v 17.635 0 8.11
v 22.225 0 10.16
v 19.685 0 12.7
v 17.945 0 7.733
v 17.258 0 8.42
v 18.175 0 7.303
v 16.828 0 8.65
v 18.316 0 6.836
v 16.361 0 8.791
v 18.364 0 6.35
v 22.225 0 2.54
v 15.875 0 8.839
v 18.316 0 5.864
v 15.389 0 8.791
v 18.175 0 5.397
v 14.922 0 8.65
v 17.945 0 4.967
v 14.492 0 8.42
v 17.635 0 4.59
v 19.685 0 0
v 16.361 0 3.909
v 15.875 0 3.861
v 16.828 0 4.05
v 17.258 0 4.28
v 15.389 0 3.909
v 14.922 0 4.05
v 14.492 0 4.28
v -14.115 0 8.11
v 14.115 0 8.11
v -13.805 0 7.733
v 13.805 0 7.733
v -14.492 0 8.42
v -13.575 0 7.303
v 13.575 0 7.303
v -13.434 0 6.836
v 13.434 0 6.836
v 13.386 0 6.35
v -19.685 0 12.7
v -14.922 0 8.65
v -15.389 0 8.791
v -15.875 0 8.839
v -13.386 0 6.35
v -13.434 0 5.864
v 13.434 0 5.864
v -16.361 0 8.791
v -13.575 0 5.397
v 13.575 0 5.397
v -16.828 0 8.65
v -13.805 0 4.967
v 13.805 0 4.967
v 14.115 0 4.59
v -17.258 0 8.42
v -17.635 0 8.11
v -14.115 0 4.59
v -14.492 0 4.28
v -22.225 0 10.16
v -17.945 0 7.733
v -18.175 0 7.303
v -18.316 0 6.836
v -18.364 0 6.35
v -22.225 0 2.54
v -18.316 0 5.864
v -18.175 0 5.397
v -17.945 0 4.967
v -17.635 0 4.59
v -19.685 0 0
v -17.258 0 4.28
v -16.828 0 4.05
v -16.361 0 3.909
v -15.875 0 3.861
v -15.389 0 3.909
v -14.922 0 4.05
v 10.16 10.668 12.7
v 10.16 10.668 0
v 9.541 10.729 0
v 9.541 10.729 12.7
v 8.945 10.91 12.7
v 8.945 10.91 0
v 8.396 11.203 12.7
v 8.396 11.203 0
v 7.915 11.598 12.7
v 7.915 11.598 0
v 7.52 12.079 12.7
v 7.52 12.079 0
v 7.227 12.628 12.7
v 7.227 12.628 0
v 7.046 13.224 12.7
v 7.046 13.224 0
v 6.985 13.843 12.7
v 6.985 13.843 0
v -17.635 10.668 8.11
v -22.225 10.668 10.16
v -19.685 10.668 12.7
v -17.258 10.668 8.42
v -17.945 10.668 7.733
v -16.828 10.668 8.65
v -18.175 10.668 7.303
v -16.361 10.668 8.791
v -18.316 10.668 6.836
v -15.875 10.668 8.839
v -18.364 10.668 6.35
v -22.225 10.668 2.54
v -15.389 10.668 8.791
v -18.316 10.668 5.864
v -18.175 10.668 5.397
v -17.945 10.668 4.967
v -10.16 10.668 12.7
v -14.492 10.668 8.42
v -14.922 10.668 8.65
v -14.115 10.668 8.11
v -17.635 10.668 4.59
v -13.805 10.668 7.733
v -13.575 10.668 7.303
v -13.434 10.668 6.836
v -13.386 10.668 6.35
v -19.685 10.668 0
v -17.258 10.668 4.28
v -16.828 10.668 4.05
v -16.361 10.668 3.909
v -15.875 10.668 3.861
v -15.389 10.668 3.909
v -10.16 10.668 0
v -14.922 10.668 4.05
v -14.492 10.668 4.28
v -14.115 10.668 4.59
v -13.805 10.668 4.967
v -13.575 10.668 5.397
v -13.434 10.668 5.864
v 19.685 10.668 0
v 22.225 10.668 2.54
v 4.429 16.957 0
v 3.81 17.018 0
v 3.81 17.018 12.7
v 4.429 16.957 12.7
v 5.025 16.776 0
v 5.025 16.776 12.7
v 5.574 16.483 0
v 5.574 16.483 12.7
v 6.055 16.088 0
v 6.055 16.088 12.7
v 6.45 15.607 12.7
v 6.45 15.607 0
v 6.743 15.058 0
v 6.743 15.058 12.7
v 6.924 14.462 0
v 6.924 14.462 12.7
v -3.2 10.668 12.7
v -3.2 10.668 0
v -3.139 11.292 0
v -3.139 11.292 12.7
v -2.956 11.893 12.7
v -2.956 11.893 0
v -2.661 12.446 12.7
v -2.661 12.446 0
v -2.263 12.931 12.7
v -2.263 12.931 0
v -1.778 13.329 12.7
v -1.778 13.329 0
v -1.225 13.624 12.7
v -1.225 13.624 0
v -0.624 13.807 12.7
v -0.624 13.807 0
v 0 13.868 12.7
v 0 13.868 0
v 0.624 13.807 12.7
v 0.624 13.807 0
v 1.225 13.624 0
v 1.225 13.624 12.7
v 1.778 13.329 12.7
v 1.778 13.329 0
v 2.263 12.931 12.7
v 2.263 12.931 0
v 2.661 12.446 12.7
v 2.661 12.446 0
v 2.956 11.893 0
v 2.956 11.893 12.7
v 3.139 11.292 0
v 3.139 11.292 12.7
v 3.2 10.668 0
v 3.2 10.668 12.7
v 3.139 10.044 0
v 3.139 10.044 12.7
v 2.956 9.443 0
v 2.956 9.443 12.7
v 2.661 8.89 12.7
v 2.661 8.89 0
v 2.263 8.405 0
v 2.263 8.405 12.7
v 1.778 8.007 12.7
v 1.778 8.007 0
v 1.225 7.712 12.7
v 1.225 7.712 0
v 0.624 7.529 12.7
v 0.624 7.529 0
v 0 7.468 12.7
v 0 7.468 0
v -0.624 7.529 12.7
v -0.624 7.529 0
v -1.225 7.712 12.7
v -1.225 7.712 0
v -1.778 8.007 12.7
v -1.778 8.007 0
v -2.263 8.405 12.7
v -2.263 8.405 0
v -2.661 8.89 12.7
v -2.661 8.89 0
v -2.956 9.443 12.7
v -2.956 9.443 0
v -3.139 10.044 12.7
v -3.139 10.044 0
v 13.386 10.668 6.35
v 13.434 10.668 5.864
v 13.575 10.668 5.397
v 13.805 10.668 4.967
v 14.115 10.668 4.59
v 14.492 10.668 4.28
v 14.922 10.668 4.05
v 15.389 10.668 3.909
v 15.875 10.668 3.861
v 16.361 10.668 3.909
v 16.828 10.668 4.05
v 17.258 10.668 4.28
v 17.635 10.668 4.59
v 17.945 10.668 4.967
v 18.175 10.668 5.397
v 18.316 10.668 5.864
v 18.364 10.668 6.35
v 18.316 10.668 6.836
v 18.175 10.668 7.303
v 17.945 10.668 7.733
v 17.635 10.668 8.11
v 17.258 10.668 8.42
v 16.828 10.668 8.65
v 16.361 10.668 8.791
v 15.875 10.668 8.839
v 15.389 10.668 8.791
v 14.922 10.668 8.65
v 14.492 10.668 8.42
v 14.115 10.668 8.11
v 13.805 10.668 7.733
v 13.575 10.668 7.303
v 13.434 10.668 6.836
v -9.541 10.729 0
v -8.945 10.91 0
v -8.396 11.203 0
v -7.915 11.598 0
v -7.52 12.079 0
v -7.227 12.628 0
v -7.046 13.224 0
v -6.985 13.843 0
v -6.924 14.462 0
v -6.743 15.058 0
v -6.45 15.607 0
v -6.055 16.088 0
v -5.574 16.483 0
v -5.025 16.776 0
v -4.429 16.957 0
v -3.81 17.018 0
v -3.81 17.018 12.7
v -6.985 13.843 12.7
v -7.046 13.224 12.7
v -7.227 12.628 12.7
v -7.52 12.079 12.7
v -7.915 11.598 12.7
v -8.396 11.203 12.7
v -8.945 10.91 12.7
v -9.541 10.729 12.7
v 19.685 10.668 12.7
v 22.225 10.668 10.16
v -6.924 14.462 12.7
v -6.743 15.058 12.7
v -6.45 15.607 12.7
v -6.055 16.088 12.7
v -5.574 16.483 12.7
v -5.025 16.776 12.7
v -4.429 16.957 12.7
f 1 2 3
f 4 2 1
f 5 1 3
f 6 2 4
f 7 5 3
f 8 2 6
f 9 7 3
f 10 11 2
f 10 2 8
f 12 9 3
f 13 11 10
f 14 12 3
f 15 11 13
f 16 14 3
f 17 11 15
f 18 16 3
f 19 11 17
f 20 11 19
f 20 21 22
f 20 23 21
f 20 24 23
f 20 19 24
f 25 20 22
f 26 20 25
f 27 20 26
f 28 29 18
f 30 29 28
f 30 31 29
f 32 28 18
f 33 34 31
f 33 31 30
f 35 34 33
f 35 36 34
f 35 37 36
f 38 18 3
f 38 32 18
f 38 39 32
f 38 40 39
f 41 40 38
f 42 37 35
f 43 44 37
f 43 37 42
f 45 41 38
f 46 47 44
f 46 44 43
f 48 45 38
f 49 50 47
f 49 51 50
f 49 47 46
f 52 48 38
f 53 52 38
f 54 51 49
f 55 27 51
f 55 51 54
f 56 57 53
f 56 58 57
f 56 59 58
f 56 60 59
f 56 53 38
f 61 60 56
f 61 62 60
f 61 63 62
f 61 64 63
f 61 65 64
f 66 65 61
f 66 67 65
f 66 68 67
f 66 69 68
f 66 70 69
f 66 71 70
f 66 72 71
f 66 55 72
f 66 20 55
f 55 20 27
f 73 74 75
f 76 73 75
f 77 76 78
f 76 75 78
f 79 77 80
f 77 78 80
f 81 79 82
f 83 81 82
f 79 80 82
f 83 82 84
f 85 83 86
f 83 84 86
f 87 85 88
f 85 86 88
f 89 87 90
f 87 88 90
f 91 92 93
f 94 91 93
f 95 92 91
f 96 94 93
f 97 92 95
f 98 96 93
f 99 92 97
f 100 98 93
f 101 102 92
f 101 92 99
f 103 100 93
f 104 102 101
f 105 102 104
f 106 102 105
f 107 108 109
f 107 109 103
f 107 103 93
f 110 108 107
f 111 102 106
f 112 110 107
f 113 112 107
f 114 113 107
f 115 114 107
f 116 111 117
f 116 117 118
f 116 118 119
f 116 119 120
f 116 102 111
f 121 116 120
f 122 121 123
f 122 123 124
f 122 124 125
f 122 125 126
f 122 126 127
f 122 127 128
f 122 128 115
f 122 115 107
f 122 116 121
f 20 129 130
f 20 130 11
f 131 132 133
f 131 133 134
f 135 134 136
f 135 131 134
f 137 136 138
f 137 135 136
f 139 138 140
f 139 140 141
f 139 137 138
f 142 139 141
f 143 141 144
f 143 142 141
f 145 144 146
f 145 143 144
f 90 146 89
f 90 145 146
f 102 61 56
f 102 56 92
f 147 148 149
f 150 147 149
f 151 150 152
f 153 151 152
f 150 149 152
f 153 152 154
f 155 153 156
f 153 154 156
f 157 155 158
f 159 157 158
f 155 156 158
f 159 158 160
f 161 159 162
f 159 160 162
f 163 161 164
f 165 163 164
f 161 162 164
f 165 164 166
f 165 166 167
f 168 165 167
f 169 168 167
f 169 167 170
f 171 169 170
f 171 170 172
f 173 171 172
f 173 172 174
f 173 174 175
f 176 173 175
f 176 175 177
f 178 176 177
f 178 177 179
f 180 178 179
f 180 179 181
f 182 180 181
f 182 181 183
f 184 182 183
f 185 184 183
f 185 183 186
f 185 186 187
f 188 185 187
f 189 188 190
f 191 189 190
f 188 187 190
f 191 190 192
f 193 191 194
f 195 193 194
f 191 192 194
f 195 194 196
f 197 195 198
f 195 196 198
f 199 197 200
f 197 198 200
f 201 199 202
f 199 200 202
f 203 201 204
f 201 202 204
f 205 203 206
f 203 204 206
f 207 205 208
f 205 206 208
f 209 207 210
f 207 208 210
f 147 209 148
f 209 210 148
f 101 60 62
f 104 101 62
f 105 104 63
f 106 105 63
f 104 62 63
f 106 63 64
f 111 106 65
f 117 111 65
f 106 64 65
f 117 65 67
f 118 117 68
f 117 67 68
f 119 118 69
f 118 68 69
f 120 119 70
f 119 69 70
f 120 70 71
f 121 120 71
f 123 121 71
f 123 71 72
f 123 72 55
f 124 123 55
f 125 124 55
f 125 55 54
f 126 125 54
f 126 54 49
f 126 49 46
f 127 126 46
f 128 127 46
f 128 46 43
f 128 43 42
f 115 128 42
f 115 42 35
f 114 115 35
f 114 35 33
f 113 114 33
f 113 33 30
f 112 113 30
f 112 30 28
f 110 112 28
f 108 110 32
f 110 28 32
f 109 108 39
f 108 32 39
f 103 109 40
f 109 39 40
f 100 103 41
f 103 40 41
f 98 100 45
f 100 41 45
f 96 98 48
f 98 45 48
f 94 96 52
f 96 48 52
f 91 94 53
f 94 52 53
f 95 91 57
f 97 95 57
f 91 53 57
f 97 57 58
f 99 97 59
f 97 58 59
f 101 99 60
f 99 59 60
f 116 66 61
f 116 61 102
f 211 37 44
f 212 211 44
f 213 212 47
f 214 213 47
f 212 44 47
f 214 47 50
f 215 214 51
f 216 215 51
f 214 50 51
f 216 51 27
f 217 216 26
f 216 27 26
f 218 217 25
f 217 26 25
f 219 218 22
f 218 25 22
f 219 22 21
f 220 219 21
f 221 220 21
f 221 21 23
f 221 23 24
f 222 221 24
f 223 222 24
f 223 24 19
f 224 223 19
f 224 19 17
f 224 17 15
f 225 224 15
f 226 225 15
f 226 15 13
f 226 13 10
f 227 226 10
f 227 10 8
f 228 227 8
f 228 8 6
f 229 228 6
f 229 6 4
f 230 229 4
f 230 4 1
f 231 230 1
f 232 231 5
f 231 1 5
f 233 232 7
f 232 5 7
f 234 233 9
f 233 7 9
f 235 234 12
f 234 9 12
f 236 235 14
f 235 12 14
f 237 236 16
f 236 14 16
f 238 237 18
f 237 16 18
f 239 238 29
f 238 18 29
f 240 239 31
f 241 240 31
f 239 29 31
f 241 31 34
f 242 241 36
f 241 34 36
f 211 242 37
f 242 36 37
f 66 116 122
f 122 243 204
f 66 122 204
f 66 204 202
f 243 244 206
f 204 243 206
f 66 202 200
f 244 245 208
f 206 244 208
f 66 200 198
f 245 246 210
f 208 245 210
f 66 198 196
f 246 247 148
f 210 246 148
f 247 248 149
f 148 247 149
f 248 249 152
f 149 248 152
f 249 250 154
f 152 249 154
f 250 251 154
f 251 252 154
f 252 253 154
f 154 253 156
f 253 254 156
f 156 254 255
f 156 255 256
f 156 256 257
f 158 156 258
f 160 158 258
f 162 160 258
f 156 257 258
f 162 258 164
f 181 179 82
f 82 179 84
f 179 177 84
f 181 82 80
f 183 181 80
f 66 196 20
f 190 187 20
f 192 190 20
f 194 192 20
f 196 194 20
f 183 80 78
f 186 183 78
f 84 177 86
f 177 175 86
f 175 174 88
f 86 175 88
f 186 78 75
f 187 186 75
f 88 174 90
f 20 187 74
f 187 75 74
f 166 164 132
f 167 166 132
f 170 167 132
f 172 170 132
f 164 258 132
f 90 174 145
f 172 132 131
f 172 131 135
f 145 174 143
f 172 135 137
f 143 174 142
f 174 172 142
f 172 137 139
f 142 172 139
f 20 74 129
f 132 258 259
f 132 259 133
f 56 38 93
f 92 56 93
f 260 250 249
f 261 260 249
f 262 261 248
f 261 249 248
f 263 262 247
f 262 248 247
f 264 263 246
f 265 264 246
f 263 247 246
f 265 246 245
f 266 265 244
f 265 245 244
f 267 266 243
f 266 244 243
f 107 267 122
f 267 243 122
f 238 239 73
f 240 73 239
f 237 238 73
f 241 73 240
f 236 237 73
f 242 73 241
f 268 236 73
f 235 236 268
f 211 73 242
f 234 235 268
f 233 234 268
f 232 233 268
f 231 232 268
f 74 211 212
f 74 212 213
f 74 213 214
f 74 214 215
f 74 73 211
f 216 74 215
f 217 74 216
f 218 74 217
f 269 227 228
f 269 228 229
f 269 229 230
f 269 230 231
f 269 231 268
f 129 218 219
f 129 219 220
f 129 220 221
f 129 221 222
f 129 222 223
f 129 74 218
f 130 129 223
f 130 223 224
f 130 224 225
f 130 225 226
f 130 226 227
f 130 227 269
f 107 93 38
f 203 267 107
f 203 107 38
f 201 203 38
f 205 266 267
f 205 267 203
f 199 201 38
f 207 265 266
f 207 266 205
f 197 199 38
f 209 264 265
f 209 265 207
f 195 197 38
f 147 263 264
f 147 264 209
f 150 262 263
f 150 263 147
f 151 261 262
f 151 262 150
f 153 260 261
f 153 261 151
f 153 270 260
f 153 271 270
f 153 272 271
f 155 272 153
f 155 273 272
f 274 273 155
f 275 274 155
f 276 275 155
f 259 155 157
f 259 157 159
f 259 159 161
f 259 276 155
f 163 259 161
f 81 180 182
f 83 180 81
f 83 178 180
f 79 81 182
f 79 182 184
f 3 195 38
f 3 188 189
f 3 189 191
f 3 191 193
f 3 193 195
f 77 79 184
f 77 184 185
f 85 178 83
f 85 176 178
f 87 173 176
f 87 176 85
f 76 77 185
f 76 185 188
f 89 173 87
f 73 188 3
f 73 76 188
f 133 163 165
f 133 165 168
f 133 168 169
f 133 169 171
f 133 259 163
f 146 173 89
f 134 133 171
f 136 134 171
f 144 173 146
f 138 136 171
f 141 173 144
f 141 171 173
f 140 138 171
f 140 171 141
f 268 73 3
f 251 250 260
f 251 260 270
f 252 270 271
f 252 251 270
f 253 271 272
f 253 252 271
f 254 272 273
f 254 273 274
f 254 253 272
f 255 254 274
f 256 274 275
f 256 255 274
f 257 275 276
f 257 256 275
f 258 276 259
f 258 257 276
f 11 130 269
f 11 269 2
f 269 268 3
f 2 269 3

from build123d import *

# Parameters (mm, degrees)
BOSS_EXTRUDE1_DEPTH        = 12.7
CHAMFER1_SIZE              = 2.54
HOLE1_D                    = 4.9784
HOLE2_D                    = 4.9784
F_6_4_6_4_DIAMETER_HOLE1_D = 6.4
FILLET1_START              = -1
FILLET1_DEPTH              = 15
FILLET1_2_DEPTH            = 12.7


with BuildPart() as part:
    # Sketch1 → Boss-Extrude1 (new body)
    with BuildSketch(Plane(origin=(0, 0, 0), x_dir=(-1, 0, 0), z_dir=(0, 0, -1))):
        Polygon((-6.985, 10.668), (-22.225, 10.668), (-22.225, 0), (22.225, 0), (22.225, 10.668), (6.985, 10.668), (6.985, 17.018), (-6.985, 17.018), align=None)
    extrude(amount=-BOSS_EXTRUDE1_DEPTH)

    # Chamfer1
    chamfer1_edges = [part.edges().sort_by_distance(p)[0] for p in [
        (22.225, 5.334, 0),
        (22.225, 5.334, 12.7),
        (-22.225, 5.334, 12.7),
        (-22.225, 5.334, 0),
    ]]
    chamfer(chamfer1_edges, length=CHAMFER1_SIZE)

    # Hole1 (through all)
    with Locations(Plane(origin=(0, 10.668, 0), x_dir=(1, 0, 0), z_dir=(0, 1, 0))):
        with Locations((15.875, -6.35)):
            Hole(HOLE1_D / 2)

    # Hole2 (through all)
    with Locations(Plane(origin=(0, 10.668, 0), x_dir=(1, 0, 0), z_dir=(0, 1, 0))):
        with Locations((-15.875, -6.35)):
            Hole(HOLE2_D / 2)

    # Ø6.4 (6.4) Diameter Hole1 (through all)
    with Locations(Plane.XY.offset(12.7)):
        with Locations((0, 10.668)):
            Hole(F_6_4_6_4_DIAMETER_HOLE1_D / 2)

    # Fillet1: read off the stored shape, not the designer's step
    # Fillet1 outline → Fillet1 (cut)
    with BuildSketch(Plane.XY.offset(FILLET1_START)):
        with BuildLine():
            Line((-6.985, 17.018), (-6.985, 13.843))
            ThreePointArc((-6.985, 13.843), (-6.05506403, 16.08806403), (-3.81, 17.018))
            Line((-3.81, 17.018), (-6.985, 17.018))
        make_face()
        with BuildLine():
            Line((6.985, 17.018), (3.81, 17.018))
            ThreePointArc((3.81, 17.018), (6.05506403, 16.08806403), (6.985, 13.843))
            Line((6.985, 13.843), (6.985, 17.018))
        make_face()
    extrude(amount=FILLET1_DEPTH, mode=Mode.SUBTRACT)

    # Fillet1 2 outline → Fillet1 2 (add)
    with BuildSketch(Plane.XY):
        with BuildLine():
            Line((-6.985, 10.668), (-6.985, 13.843))
            ThreePointArc((-6.985, 13.843), (-7.91493597, 11.59793597), (-10.16, 10.668))
            Line((-10.16, 10.668), (-6.985, 10.668))
        make_face()
        with BuildLine():
            ThreePointArc((10.16, 10.668), (7.91493597, 11.59793597), (6.985, 13.843))
            Line((6.985, 13.843), (6.985, 10.668))
            Line((6.985, 10.668), (10.16, 10.668))
        make_face()
    extrude(amount=FILLET1_2_DEPTH)


solid = part.part
